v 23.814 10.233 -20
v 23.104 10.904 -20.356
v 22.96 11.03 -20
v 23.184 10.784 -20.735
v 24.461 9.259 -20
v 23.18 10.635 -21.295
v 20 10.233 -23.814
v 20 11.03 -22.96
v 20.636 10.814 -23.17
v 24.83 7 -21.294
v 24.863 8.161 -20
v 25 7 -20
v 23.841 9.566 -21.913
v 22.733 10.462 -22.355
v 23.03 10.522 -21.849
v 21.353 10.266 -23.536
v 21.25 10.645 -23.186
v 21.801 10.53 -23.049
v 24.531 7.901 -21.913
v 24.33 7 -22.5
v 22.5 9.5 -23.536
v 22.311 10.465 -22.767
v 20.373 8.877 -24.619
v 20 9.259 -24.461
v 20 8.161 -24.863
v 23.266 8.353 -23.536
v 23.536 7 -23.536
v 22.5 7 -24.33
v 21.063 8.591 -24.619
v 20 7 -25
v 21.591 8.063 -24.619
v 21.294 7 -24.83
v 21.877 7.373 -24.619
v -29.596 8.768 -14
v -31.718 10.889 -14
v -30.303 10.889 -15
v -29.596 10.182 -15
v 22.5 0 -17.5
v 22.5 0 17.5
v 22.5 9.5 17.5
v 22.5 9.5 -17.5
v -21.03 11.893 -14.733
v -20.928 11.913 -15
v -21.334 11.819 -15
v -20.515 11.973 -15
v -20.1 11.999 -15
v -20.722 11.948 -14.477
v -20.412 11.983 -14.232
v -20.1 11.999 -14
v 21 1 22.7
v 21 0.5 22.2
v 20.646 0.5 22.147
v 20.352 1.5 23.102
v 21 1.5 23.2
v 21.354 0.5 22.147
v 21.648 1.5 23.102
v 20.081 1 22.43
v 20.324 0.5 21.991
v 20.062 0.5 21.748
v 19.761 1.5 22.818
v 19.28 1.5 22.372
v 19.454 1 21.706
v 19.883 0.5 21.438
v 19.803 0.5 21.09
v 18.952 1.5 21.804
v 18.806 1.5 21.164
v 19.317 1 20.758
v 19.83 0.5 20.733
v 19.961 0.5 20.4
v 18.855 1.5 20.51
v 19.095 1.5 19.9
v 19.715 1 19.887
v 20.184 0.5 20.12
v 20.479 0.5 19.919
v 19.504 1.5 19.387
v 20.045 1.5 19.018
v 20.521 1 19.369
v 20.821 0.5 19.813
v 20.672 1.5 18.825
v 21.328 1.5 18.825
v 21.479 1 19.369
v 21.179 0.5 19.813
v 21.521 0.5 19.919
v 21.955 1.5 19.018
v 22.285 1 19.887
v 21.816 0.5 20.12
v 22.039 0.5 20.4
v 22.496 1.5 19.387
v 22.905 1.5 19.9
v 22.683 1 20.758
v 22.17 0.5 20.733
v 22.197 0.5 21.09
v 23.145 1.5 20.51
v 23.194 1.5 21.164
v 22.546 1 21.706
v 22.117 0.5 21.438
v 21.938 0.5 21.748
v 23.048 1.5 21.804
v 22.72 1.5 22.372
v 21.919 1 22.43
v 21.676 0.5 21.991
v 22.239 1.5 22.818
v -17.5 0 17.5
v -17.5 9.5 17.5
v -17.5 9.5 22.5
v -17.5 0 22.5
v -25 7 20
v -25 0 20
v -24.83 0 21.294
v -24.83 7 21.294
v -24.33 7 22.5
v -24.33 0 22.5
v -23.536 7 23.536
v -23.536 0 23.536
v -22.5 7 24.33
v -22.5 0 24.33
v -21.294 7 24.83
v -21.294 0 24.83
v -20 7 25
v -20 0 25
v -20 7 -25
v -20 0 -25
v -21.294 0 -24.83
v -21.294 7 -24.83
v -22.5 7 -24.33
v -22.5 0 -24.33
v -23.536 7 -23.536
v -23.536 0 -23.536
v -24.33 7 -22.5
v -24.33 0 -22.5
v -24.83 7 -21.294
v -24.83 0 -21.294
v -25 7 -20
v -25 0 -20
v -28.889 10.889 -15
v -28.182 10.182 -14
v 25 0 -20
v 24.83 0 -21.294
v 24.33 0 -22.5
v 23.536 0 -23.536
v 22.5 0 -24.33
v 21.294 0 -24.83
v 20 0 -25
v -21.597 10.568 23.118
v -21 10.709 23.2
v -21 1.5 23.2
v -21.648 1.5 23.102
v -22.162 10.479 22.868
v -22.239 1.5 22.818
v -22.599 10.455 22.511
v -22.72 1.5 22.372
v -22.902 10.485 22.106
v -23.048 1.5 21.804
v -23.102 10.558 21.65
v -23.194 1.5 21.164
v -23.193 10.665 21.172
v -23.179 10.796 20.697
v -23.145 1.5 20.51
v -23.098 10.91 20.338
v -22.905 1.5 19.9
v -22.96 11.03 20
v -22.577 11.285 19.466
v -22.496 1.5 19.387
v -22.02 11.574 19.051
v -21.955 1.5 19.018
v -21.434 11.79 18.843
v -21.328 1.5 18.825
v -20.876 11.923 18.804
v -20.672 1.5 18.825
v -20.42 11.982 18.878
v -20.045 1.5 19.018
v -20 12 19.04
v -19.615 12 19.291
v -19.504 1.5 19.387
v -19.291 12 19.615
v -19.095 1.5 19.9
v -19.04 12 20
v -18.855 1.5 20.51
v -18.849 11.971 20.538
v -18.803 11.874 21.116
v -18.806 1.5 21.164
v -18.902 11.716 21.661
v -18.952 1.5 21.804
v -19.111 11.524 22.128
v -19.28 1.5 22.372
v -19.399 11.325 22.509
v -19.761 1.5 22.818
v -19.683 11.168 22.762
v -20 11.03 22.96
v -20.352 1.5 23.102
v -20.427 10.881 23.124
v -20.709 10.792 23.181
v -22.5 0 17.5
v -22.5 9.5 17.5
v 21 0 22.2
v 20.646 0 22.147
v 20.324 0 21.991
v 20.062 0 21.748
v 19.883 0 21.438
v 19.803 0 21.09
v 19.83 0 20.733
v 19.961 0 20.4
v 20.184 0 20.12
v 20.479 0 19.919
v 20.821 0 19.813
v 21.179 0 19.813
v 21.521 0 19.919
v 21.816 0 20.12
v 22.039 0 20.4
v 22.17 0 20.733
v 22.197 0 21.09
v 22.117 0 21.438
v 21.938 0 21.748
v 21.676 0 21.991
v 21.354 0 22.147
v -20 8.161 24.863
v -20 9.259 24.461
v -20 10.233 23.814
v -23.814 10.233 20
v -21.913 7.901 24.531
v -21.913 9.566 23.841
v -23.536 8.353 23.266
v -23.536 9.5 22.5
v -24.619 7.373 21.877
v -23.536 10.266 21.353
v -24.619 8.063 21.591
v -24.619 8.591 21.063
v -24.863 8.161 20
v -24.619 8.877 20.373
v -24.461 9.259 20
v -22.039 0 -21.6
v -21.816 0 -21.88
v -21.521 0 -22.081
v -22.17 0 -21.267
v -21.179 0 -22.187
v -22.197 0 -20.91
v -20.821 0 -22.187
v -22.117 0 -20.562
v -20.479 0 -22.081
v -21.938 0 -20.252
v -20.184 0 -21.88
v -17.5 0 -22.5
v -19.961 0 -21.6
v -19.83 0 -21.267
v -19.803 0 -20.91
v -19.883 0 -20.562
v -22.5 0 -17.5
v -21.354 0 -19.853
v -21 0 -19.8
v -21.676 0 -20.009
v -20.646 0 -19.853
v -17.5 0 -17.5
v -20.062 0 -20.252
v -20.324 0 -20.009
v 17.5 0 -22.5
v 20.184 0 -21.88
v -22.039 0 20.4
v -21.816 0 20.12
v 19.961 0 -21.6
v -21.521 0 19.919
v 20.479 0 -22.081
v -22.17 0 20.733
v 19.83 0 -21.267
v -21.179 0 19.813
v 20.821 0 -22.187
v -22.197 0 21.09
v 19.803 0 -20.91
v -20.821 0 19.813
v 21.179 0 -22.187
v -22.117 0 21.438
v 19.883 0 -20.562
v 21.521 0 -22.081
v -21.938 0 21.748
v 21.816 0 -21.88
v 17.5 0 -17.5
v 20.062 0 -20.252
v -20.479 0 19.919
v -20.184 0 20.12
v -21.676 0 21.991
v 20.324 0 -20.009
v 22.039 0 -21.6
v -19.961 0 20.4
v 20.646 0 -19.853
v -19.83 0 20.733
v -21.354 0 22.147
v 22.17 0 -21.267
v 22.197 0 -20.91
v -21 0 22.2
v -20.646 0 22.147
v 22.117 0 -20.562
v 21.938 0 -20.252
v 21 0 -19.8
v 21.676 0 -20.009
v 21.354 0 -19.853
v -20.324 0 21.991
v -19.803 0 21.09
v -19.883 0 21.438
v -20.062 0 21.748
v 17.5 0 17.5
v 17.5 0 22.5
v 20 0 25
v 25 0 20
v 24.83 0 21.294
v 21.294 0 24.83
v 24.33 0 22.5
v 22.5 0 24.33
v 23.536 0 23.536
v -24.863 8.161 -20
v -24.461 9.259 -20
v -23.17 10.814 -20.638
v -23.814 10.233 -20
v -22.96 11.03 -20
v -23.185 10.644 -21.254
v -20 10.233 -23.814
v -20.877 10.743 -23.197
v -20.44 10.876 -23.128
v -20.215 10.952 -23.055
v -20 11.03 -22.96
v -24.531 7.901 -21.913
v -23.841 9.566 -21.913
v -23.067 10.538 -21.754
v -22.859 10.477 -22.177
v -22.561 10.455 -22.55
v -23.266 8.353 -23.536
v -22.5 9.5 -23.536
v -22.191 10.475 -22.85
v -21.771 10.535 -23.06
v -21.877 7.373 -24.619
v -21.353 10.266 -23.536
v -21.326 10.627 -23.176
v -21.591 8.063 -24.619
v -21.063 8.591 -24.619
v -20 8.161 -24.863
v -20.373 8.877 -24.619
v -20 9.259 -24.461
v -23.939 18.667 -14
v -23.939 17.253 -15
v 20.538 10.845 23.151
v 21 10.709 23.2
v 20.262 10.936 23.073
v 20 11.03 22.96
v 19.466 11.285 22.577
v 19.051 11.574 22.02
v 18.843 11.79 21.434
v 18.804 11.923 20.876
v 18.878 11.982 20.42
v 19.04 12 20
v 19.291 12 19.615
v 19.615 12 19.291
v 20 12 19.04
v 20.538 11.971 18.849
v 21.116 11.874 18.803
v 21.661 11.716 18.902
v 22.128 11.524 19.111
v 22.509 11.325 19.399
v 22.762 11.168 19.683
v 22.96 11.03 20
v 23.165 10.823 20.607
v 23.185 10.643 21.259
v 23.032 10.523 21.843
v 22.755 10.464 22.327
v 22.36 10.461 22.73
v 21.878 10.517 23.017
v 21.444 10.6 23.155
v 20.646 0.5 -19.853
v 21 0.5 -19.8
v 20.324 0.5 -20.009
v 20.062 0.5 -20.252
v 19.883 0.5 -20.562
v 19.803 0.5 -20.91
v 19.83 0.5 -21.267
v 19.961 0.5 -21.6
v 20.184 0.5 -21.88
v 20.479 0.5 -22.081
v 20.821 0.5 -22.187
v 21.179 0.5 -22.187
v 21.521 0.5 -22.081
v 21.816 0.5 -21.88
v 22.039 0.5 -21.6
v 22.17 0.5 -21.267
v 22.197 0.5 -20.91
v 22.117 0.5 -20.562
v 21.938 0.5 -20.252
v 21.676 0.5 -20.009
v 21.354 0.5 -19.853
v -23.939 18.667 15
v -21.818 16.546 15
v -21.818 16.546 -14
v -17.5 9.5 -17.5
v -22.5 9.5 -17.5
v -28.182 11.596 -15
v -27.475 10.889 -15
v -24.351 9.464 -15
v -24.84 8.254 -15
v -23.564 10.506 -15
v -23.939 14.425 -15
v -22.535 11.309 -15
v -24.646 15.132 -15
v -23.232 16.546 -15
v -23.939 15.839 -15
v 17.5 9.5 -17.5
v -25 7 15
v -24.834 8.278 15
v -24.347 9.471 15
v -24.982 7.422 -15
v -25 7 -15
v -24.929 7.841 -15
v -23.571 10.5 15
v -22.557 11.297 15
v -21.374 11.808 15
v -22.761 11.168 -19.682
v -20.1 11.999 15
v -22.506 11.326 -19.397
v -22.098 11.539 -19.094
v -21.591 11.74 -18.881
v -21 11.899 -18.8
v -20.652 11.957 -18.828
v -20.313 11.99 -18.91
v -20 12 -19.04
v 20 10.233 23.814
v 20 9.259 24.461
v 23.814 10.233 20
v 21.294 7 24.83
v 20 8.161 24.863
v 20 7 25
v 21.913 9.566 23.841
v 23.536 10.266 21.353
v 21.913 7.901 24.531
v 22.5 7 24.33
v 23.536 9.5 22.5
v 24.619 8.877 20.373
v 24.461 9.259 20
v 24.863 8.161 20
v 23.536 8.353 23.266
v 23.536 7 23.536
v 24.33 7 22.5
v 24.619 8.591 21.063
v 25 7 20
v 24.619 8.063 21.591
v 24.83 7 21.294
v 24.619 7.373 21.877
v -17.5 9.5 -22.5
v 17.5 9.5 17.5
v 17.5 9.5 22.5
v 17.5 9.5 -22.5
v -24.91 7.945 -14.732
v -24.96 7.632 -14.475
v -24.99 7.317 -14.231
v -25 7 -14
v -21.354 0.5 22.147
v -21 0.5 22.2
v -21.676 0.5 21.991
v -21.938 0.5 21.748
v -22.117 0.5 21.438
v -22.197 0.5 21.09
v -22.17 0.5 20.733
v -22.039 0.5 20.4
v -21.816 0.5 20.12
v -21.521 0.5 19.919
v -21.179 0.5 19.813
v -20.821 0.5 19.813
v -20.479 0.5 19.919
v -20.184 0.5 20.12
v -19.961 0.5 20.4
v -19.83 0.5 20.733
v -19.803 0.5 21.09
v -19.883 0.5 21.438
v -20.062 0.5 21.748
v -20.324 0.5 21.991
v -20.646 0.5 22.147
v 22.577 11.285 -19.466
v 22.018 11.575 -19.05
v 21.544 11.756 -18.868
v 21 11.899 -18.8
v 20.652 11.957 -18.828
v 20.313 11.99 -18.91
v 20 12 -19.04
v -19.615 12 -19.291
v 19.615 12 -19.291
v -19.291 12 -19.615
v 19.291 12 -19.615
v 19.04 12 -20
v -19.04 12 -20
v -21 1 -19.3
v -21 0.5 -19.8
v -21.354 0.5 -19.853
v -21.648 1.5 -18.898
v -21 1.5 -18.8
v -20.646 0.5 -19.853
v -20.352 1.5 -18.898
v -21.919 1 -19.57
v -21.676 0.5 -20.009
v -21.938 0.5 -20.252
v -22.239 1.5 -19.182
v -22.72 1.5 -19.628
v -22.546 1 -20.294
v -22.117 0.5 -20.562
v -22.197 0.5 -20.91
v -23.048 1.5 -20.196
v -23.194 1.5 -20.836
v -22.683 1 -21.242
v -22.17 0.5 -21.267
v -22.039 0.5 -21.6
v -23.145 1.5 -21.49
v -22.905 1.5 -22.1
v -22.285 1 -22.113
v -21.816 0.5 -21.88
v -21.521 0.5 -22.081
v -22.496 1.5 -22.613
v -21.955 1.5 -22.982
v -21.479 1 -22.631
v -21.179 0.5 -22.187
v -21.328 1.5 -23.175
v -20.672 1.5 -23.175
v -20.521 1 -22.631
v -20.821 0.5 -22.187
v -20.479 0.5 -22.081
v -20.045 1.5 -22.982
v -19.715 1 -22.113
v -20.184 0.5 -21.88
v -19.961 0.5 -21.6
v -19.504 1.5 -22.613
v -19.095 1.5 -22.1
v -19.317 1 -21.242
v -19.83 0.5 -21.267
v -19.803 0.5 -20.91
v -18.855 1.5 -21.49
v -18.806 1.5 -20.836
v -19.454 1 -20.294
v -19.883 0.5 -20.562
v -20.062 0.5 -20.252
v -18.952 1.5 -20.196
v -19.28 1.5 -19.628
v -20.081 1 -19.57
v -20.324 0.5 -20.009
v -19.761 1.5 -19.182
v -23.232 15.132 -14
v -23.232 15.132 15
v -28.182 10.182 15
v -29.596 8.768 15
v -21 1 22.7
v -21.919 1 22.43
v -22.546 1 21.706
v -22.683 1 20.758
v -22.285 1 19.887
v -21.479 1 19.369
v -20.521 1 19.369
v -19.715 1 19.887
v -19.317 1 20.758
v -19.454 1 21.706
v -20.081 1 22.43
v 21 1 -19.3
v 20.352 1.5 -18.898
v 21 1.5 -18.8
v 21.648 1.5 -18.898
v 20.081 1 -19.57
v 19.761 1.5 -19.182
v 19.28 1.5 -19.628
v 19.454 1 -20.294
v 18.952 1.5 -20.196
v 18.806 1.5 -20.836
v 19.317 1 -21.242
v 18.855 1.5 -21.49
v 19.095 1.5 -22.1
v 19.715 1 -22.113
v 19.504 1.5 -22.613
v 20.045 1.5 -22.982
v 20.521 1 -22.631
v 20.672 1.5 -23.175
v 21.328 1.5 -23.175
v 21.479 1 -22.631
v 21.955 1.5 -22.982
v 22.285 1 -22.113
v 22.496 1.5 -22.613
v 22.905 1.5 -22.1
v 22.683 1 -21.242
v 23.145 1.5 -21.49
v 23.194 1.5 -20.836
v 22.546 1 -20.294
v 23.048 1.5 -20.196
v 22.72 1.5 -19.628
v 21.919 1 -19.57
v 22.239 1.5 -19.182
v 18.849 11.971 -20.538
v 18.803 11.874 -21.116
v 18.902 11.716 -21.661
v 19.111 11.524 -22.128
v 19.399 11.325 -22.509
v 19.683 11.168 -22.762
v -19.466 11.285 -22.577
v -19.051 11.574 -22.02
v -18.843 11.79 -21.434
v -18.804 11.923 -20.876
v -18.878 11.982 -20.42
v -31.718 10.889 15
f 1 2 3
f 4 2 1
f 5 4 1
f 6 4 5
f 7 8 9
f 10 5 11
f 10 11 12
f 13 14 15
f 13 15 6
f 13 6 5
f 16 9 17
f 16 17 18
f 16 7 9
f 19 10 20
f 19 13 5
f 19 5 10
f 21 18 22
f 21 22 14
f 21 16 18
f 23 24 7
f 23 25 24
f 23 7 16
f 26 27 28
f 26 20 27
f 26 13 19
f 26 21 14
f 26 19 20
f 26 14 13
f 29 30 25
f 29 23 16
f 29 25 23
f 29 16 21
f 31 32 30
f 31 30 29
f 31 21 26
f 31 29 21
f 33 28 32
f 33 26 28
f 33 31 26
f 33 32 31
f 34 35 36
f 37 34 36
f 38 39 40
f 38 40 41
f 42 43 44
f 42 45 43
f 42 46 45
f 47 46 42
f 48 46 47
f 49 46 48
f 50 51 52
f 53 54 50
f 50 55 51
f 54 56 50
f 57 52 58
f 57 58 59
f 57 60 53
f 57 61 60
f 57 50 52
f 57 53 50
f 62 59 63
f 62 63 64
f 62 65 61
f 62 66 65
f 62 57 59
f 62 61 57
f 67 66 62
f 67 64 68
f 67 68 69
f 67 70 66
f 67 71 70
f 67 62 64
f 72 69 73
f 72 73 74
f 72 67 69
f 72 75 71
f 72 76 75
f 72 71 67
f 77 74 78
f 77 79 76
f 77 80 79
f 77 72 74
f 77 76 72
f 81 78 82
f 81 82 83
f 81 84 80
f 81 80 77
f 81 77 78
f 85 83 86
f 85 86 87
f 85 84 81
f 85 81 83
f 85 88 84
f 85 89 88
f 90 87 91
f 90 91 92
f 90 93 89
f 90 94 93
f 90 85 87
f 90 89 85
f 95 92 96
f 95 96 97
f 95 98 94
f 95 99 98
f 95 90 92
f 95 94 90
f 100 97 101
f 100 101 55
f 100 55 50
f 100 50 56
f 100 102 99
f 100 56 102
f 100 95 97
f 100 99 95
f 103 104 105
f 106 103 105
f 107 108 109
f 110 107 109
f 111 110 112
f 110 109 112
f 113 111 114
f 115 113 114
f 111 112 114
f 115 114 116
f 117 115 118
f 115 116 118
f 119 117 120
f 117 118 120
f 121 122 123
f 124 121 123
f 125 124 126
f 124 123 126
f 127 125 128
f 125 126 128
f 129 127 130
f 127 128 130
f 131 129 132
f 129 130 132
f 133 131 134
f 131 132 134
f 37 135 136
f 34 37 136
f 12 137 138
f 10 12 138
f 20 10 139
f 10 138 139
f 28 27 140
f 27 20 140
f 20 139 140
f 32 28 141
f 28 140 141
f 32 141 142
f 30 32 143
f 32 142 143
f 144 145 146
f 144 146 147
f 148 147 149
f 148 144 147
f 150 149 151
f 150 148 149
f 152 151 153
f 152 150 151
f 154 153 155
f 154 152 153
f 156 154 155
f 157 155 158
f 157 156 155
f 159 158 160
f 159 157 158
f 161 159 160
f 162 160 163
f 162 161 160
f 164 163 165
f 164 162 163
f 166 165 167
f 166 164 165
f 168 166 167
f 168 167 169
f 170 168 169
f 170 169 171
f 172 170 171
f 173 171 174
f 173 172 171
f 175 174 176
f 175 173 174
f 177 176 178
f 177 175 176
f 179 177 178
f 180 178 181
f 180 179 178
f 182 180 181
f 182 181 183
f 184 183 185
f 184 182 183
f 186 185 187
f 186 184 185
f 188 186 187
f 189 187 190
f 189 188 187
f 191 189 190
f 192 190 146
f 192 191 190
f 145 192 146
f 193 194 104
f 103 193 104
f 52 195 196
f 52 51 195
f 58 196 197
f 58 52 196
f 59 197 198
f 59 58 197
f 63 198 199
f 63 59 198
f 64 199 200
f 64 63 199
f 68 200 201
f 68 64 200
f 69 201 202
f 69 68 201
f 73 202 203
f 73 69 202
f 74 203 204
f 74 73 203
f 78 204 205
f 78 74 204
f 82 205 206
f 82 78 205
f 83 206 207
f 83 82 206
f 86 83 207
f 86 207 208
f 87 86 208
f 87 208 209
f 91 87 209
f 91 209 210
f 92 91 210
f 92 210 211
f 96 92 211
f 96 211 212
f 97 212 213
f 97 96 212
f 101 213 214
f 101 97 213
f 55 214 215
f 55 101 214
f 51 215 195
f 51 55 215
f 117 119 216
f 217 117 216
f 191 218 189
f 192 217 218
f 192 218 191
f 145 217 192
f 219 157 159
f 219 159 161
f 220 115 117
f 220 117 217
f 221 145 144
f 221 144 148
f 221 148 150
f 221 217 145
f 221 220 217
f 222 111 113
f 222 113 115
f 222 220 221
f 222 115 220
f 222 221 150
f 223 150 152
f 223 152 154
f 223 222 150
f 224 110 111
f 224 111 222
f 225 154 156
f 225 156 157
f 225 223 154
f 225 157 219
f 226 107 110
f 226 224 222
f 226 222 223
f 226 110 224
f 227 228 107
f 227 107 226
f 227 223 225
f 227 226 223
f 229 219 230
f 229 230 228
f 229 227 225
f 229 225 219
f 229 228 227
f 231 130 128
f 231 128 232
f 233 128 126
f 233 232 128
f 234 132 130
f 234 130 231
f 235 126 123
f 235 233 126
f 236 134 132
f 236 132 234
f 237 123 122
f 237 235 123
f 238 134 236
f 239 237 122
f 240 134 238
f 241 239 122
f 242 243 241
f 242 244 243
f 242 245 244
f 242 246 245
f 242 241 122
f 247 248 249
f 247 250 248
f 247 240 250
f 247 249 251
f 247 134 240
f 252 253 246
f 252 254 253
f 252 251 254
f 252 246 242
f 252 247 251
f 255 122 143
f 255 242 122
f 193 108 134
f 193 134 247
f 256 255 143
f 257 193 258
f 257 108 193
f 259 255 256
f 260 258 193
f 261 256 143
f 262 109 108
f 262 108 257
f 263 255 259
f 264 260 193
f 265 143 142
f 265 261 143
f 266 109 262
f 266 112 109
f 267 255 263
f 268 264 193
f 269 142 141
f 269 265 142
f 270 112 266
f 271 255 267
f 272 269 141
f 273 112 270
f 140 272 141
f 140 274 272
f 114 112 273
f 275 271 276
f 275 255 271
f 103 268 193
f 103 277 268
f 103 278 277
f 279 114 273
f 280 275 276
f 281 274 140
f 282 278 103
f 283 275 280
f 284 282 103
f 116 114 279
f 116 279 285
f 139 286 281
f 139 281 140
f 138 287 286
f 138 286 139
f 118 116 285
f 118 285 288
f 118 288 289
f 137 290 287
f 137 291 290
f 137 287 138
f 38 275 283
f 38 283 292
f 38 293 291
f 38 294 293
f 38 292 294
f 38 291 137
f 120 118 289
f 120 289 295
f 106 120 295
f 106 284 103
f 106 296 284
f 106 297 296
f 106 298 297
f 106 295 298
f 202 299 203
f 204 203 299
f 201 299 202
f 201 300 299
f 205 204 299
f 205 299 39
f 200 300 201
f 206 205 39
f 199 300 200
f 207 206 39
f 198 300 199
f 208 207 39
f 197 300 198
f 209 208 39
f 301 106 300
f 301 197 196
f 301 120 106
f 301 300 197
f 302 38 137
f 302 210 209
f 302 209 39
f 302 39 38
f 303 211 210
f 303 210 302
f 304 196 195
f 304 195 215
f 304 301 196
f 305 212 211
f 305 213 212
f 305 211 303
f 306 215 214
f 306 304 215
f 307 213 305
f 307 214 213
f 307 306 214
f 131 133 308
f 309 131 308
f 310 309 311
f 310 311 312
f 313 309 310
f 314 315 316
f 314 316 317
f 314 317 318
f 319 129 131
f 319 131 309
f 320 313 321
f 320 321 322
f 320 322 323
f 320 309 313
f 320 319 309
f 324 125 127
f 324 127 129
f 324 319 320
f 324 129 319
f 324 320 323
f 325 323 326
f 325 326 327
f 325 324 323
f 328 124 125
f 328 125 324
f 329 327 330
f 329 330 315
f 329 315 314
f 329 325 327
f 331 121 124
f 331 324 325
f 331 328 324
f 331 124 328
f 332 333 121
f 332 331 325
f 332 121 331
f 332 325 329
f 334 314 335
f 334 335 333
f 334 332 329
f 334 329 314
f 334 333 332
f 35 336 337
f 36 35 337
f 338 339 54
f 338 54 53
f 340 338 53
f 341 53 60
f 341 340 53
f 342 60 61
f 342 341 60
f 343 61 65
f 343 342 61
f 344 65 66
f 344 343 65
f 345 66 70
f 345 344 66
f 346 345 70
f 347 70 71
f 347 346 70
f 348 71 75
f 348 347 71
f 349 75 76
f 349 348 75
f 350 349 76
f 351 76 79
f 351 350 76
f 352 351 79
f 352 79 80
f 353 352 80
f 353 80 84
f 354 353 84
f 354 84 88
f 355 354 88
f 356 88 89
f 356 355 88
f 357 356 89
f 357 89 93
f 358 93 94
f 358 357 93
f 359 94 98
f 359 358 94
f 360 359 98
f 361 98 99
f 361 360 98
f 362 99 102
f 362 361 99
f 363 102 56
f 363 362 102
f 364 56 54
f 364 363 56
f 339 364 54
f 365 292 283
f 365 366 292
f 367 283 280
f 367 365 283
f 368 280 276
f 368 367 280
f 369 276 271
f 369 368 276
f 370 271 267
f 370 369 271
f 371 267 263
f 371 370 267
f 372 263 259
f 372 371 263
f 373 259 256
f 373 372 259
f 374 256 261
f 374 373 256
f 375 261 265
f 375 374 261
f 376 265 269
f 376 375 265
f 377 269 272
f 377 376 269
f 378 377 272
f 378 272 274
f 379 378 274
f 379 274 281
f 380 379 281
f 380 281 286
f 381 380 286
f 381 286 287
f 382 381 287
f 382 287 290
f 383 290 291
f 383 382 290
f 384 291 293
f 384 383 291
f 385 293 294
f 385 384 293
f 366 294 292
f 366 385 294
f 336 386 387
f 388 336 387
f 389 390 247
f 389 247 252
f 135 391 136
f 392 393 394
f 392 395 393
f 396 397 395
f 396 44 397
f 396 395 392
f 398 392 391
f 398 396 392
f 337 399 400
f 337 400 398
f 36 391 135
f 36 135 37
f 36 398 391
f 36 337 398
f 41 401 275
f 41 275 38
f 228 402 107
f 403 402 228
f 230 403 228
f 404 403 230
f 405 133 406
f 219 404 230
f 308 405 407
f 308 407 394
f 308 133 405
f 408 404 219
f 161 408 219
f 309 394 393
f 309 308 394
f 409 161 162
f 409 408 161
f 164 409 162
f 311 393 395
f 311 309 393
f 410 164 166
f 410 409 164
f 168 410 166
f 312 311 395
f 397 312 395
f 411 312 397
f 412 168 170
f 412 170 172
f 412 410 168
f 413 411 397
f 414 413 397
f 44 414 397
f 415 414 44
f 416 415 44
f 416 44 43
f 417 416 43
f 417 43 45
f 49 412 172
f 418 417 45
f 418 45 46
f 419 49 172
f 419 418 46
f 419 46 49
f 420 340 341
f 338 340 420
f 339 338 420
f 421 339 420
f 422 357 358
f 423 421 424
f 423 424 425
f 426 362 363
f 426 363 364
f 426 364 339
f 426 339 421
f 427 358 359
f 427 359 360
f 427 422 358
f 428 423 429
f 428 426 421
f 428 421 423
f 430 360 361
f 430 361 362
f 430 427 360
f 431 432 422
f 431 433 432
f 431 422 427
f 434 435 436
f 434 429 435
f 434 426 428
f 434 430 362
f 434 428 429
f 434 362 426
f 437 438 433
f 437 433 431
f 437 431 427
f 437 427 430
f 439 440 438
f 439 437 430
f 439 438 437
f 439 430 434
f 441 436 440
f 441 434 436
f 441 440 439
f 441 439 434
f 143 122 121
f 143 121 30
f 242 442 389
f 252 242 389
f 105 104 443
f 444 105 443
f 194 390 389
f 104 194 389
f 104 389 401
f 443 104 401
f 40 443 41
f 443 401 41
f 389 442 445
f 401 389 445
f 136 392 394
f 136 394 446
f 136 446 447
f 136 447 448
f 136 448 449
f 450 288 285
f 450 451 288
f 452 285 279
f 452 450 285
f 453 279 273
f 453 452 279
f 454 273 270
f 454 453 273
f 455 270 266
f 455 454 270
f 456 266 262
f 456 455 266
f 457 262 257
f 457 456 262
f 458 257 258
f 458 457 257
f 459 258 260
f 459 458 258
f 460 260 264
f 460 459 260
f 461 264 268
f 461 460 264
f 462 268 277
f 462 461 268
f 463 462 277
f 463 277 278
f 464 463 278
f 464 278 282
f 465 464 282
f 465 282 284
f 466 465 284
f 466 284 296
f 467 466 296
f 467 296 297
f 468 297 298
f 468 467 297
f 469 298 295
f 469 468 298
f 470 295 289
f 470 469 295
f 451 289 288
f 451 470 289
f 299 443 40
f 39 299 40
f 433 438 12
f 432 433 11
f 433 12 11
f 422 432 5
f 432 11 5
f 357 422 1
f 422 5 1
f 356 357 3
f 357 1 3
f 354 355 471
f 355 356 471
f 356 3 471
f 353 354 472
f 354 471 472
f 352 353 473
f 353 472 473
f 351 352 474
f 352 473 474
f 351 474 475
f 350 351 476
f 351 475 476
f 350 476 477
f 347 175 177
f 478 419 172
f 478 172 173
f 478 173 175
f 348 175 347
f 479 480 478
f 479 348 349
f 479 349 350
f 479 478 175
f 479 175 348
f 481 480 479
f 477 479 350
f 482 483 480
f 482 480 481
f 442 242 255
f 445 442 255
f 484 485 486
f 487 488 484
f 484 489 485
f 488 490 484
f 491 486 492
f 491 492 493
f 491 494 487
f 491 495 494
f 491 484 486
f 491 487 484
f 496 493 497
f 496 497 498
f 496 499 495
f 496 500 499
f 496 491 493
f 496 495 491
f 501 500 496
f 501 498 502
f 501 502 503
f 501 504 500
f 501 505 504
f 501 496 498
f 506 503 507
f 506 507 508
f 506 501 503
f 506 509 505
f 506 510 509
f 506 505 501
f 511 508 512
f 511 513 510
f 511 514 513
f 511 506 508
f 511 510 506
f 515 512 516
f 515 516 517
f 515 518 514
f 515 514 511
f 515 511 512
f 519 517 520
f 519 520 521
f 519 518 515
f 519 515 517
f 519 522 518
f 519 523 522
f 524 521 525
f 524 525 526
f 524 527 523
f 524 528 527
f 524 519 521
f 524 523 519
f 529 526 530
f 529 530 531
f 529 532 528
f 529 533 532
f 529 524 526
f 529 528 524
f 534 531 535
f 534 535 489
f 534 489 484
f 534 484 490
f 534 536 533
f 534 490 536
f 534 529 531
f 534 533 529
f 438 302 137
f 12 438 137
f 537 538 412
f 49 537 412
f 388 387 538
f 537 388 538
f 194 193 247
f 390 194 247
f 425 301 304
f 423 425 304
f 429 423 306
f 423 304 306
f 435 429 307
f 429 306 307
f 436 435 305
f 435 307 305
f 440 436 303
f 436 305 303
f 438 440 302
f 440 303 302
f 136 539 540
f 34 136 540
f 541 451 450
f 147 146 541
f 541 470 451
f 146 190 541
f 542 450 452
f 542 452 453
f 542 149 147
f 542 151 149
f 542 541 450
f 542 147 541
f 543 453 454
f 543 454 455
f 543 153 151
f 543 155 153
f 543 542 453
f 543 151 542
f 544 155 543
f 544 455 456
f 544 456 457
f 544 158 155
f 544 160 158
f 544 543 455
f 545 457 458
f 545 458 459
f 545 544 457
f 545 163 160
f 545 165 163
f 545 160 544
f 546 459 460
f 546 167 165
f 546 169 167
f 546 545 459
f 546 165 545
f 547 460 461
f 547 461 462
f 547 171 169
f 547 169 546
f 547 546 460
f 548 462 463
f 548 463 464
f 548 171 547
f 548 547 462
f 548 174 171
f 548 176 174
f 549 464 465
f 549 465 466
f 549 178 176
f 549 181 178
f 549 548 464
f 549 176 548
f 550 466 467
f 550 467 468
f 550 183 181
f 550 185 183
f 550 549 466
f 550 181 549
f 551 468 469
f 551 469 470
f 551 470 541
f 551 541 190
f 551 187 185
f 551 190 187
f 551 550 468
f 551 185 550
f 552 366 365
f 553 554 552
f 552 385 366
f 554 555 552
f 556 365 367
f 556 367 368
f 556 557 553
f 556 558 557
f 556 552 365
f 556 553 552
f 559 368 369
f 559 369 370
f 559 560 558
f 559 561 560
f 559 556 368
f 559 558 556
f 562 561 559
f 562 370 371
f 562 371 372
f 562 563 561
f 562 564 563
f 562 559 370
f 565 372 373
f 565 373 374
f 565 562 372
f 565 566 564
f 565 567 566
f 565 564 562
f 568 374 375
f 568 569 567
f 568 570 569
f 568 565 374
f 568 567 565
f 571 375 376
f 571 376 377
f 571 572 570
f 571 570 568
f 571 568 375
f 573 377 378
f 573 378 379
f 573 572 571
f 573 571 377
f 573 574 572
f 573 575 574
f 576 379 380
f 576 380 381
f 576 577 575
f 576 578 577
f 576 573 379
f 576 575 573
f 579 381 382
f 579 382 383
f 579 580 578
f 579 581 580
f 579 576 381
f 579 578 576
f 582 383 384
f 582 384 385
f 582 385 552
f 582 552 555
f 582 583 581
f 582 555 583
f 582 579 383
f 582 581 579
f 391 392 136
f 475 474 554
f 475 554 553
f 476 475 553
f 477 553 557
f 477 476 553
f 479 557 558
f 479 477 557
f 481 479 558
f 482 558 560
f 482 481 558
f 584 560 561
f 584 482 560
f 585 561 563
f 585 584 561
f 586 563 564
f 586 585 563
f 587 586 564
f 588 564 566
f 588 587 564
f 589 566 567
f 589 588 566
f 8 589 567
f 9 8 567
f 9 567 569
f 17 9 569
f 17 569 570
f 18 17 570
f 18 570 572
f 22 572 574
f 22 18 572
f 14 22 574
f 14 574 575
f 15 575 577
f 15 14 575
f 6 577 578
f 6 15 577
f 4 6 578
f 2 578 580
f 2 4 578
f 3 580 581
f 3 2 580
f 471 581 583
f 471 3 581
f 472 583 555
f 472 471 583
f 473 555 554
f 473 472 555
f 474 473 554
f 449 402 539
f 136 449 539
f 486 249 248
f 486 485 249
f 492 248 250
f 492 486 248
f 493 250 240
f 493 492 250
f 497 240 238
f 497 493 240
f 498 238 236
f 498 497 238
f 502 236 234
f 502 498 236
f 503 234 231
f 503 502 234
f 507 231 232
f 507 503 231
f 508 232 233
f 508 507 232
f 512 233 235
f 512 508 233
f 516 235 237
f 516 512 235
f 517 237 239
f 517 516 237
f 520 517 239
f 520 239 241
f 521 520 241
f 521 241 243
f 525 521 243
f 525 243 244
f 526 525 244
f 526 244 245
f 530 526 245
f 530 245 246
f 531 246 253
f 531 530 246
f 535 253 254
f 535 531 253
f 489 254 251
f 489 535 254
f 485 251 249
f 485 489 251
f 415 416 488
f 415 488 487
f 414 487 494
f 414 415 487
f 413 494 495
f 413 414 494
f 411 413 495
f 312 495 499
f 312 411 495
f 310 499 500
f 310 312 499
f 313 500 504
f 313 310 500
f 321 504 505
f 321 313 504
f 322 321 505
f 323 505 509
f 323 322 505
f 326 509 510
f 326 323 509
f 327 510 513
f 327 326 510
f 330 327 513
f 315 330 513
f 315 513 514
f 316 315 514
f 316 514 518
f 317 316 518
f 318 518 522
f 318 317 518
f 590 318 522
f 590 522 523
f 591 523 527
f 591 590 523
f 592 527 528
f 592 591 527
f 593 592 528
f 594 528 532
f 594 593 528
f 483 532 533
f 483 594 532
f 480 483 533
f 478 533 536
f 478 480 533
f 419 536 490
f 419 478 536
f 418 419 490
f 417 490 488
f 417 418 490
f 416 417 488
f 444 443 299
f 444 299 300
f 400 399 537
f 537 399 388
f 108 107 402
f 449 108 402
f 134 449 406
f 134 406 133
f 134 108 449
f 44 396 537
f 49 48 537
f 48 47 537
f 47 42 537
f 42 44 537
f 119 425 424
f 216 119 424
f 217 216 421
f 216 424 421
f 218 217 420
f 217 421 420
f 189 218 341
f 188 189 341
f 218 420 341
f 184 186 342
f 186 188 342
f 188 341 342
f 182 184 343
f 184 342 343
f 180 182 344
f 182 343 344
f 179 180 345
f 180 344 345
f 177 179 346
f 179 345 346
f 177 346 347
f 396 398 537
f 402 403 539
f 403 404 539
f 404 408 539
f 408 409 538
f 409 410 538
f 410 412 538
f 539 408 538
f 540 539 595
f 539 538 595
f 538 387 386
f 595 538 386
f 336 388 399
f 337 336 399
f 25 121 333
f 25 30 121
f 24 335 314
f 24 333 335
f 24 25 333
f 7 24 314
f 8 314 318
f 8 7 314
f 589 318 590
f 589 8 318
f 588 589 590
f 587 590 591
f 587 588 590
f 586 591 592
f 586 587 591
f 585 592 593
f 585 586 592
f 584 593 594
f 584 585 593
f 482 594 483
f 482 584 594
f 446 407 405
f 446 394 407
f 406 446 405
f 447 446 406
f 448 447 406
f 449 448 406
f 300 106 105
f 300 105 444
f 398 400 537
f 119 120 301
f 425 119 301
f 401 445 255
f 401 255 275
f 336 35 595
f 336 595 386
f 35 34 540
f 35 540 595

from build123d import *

# Parameters (mm, degrees)
SKETCH1_W                                    = 50
SKETCH1_H                                    = 50
MAIN_BODY_DEPTH                              = 12
SHELL1_T                                     = -2.5
FILLET1_R                                    = 5
SKETCH6_W                                    = 5
SKETCH6_H                                    = 5
SCREW_SUPPORTS_DEPTH                         = 9.5
FILLET2_R                                    = 5
CSK_SLOT_FOR_M2_COUNTERSUNK_FLAT_HEA_2_COUNT = 2
CSK_SLOT_FOR_M2_COUNTERSUNK_FLAT_HEA_2_PITCH = 42
CSK_SLOT_FOR_M2_COUNTERSUNK_FLAT_HEA_3_COUNT = 2
CSK_SLOT_FOR_M2_COUNTERSUNK_FLAT_HEA_3_PITCH = 42
CSK_SLOT_FOR_M2_COUNTERSUNK_FLAT_HEA_4_COUNT = 2
CSK_SLOT_FOR_M2_COUNTERSUNK_FLAT_HEA_4_PITCH = 59.39696962
SKETCH13_W                                   = 13
SKETCH13_H                                   = 26
TOP_CONNECTOR_EXTRUDE_DEPTH                  = 6
SKETCH14_W                                   = 2
SKETCH14_H                                   = 3
DOVETAIL_CUT_DEPTH                           = 51.884673656
FILLET3_R                                    = 2
SKETCH16_W                                   = 8
SKETCH16_H                                   = 3.3
POGO_BODY_CUT_DEPTH                          = 8
SKETCH19_W                                   = 8
SKETCH19_H                                   = 0.6
POGO_BACK_SUPPORT_DEPTH                      = 3.2
SKETCH20_W                                   = 8
SKETCH20_H                                   = 2
POGO_STOPPER_DEPTH                           = 0.6
SKETCH23_W                                   = 15
SKETCH23_H                                   = 40
CUT_EXTRUDE1_DEPTH                           = 38.336309539
BOSS_EXTRUDE1_START                          = -10
BOSS_EXTRUDE1_DEPTH                          = 30
BOSS_EXTRUDE2_DEPTH                          = 30
CHAMFER2_SIZE                                = 1


with BuildPart() as part:
    # Sketch1 → main body (new body)
    with BuildSketch(Plane(origin=(0, 0, 0), x_dir=(1, 0, 0), z_dir=(0, 1, 0))):
        Rectangle(SKETCH1_W, SKETCH1_H)
    extrude(amount=MAIN_BODY_DEPTH)

    # Shell1
    shell1_openings = [part.faces().sort_by_distance(p)[0] for p in [
        (0, 0, 0),
    ]]
    offset(amount=SHELL1_T, openings=shell1_openings, kind=Kind.INTERSECTION)

    # Fillet1
    fillet1_edges = [part.edges().sort_by_distance(p)[0] for p in [
        (25, 12, 0),
        (0, 12, -25),
        (-25, 12, 0),
        (0, 12, 25),
    ]]
    fillet(fillet1_edges, radius=FILLET1_R)

    # Sketch6 → screw supports (add)
    with BuildSketch(Plane.XZ.offset(-9.5)):
        with Locations((20, 20)):
            Rectangle(SKETCH6_W, SKETCH6_H)
        with Locations((-20, 20)):
            Rectangle(SKETCH6_W, SKETCH6_H)
        with Locations((20, -20)):
            Rectangle(SKETCH6_W, SKETCH6_H)
        with Locations((-20, -20)):
            Rectangle(SKETCH6_W, SKETCH6_H)
    extrude(amount=SCREW_SUPPORTS_DEPTH)

    # Fillet2
    # the kernel refuses this fillet: 5 mm, written as the material it takes off along each edge
    with BuildSketch(Plane(origin=(-20, 7, 20), x_dir=(0, 0, 1), z_dir=(-1, 0, 0))) as fillet2_piece_1_section:
        Polygon((0, 0), (FILLET2_R, 0), (FILLET2_R, FILLET2_R), (0, FILLET2_R), align=None)
    fillet2_piece_1 = extrude(amount=FILLET2_R, mode=Mode.PRIVATE)
    fillet2_piece_1 = fillet2_piece_1 - Plane(origin=(-20, 7, 20), x_dir=(0, -0.7071067811865475, -0.7071067811865475), z_dir=(-1, 0, 0)) * Sphere(FILLET2_R, mode=Mode.PRIVATE)
    add(fillet2_piece_1, mode=Mode.SUBTRACT)
    with BuildSketch(Plane(origin=(-20, 7, -20), x_dir=(-1, 0, 0), z_dir=(0, 0, -1))) as fillet2_piece_2_section:
        Polygon((0, 0), (FILLET2_R, 0), (FILLET2_R, FILLET2_R), (0, FILLET2_R), align=None)
    fillet2_piece_2 = extrude(amount=FILLET2_R, mode=Mode.PRIVATE)
    fillet2_piece_2 = fillet2_piece_2 - Plane(origin=(-20, 7, -20), x_dir=(0.7071067811865475, -0.7071067811865475, 0), z_dir=(0, 0, -1)) * Sphere(FILLET2_R, mode=Mode.PRIVATE)
    add(fillet2_piece_2, mode=Mode.SUBTRACT)
    with BuildSketch(Plane(origin=(20, 7, 20), x_dir=(0, 0, 1), z_dir=(1, 0, 0))) as fillet2_piece_3_section:
        Polygon((0, 0), (FILLET2_R, 0), (FILLET2_R, -FILLET2_R), (0, -FILLET2_R), align=None)
    fillet2_piece_3 = extrude(amount=FILLET2_R, mode=Mode.PRIVATE)
    fillet2_piece_3 = fillet2_piece_3 - Plane(origin=(20, 7, 20), x_dir=(0, -0.7071067811865475, -0.7071067811865475), z_dir=(1, 0, 0)) * Sphere(FILLET2_R, mode=Mode.PRIVATE)
    add(fillet2_piece_3, mode=Mode.SUBTRACT)
    with BuildSketch(Plane(origin=(20, 7, -20), x_dir=(1, 0, 0), z_dir=(0, 0, -1))) as fillet2_piece_4_section:
        Polygon((0, 0), (FILLET2_R, 0), (FILLET2_R, -FILLET2_R), (0, -FILLET2_R), align=None)
    fillet2_piece_4 = extrude(amount=FILLET2_R, mode=Mode.PRIVATE)
    fillet2_piece_4 = fillet2_piece_4 - Plane(origin=(20, 7, -20), x_dir=(-0.7071067811865475, -0.7071067811865475, 0), z_dir=(0, 0, -1)) * Sphere(FILLET2_R, mode=Mode.PRIVATE)
    add(fillet2_piece_4, mode=Mode.SUBTRACT)
    with BuildSketch(Plane(origin=(25, -12.5, -25), x_dir=(-1, 0, 0), z_dir=(0, 1, 0)), Plane(origin=(25, -12.5, 25), x_dir=(0, 0, -1), z_dir=(0, 1, 0))) as fillet2_piece_5:
        with BuildLine():
            CenterArc((FILLET2_R, FILLET2_R), FILLET2_R, 180, 90)
            Line((0, FILLET2_R), (0, 0))
            Line((0, 0), (FILLET2_R, 0))
        make_face()
    extrude(amount=19.5, mode=Mode.SUBTRACT)
    with BuildSketch(Plane(origin=(-25, -12.5, -25), x_dir=(1, 0, 0), z_dir=(0, 1, 0)), Plane(origin=(-25, -12.5, 25), x_dir=(0, 0, -1), z_dir=(0, 1, 0))) as fillet2_piece_6:
        with BuildLine():
            CenterArc((FILLET2_R, -FILLET2_R), FILLET2_R, 90, 90)
            Line((0, -FILLET2_R), (0, 0))
            Line((0, 0), (FILLET2_R, 0))
        make_face()
    extrude(amount=19.5, mode=Mode.SUBTRACT)

    # Sketch12 → CSK SLOT for M2 Countersunk Flat Head Screw1 (revolve, cut)
    with BuildSketch(Plane(origin=(-21, 12, -21), x_dir=(0, 0, 1), z_dir=(1, 0, 0))):
        Polygon((0, 0), (0, 12), (1.2, 12), (1.2, 11.5), (2.2, 10.5), (2.2, 0), align=None)
    csk_slot_for_m2_countersunk_flat_head_sc = revolve(axis=Axis((-21, 18.35, -21), (0, -1, 0)), mode=Mode.SUBTRACT)

    # CSK SLOT for M2 Countersunk Flat Hea 2: CSK SLOT for M2 Countersunk Flat Head Screw1 ×2
    with Locations(*[(i * CSK_SLOT_FOR_M2_COUNTERSUNK_FLAT_HEA_2_PITCH, 0, 0) for i in range(1, CSK_SLOT_FOR_M2_COUNTERSUNK_FLAT_HEA_2_COUNT)]):
        add(csk_slot_for_m2_countersunk_flat_head_sc, mode=Mode.SUBTRACT)

    # CSK SLOT for M2 Countersunk Flat Hea 3: CSK SLOT for M2 Countersunk Flat Head Screw1 ×2
    with Locations(*[(0, 0, i * CSK_SLOT_FOR_M2_COUNTERSUNK_FLAT_HEA_3_PITCH) for i in range(1, CSK_SLOT_FOR_M2_COUNTERSUNK_FLAT_HEA_3_COUNT)]):
        add(csk_slot_for_m2_countersunk_flat_head_sc, mode=Mode.SUBTRACT)

    # CSK SLOT for M2 Countersunk Flat Hea 4: CSK SLOT for M2 Countersunk Flat Head Screw1 ×2
    with Locations(*[Vector(0.7071067811865475, 0, 0.7071067811865477) * (i * CSK_SLOT_FOR_M2_COUNTERSUNK_FLAT_HEA_4_PITCH) for i in range(1, CSK_SLOT_FOR_M2_COUNTERSUNK_FLAT_HEA_4_COUNT)]):
        add(csk_slot_for_m2_countersunk_flat_head_sc, mode=Mode.SUBTRACT)

    # Sketch13 → top connector extrude (add)
    with BuildSketch(Plane(origin=(0, 12, 0), x_dir=(1, 0, 0), z_dir=(0, 1, 0))):
        with Locations((0, -2.5)):
            Rectangle(SKETCH13_W, SKETCH13_H)
    extrude(amount=TOP_CONNECTOR_EXTRUDE_DEPTH)

    # Sketch14 → dovetail cut (cut, through all)
    with BuildSketch(Plane.XY.offset(15.5)):
        with Locations((-5.5, 13.5)):
            Rectangle(SKETCH14_W, SKETCH14_H)
        with Locations((5.5, 13.5)):
            Rectangle(SKETCH14_W, SKETCH14_H)
    extrude(amount=-DOVETAIL_CUT_DEPTH, mode=Mode.SUBTRACT)

    # Fillet3
    fillet3_edges = [part.edges().sort_by_distance(p)[0] for p in [
        (0, 18, -10.5),
        (-6.5, 16.5, -10.5),
        (6.5, 16.5, -10.5),
    ]]
    fillet(fillet3_edges, radius=FILLET3_R)

    # Sketch16 → pogo body cut (cut)
    with BuildSketch(Plane(origin=(0, 0, -10.5), x_dir=(-1, 0, 0), z_dir=(0, 0, -1))):
        with Locations((0, 16.35)):
            Rectangle(SKETCH16_W, SKETCH16_H)
    extrude(amount=-POGO_BODY_CUT_DEPTH, mode=Mode.SUBTRACT)

    # Sketch19 → pogo back support (add)
    with BuildSketch(Plane(origin=(0, 0, -2.5), x_dir=(-1, 0, 0), z_dir=(0, 0, -1))):
        with Locations((0, 17.7)):
            Rectangle(SKETCH19_W, SKETCH19_H)
    extrude(amount=POGO_BACK_SUPPORT_DEPTH)

    # Sketch20 → pogo stopper (add)
    with BuildSketch(Plane.XZ.offset(-17.4)):
        with Locations((0, -3.5)):
            Rectangle(SKETCH20_W, SKETCH20_H)
    extrude(amount=POGO_STOPPER_DEPTH)

    # Sketch23 → Cut-Extrude1 (cut, through all)
    with BuildSketch(Plane(origin=(0, 12, 0), x_dir=(1, 0, 0), z_dir=(0, 1, 0))):
        Rectangle(SKETCH23_W, SKETCH23_H)
    extrude(amount=CUT_EXTRUDE1_DEPTH, mode=Mode.SUBTRACT)

    # Sketch27 → Boss-Extrude1 (add)
    with BuildSketch(Plane.XY.offset(25).offset(BOSS_EXTRUDE1_START)):
        Polygon((-28.181980515, 10.181980515), (-23.232233047, 15.131727984), (-20.050252532, 11.949747468), (-25, 7), align=None)
    extrude(amount=-BOSS_EXTRUDE1_DEPTH)

    # Sketch29 → Boss-Extrude2 (add)
    with BuildSketch(Plane.XY.offset(15)):
        Polygon((-31.717514421, 10.889087297), (-23.939339828, 18.66726189), (-21.818019485, 16.545941546), (-29.596194078, 8.767766953), align=None)
    extrude(amount=-BOSS_EXTRUDE2_DEPTH)

    # Chamfer2
    # the kernel refuses this chamfer: 1 mm, written as the material it takes off along each edge
    with BuildSketch(Plane(origin=(-23.18154552, 5.18154552, -15), x_dir=(0.7068394360706733, 0.7068394360706738, -0.027495876610585664), z_dir=(-0.7071067811865477, 0.7071067811865474, 0))) as chamfer2_piece_1_section:
        Polygon((CHAMFER2_SIZE * 0.999621916911, -CHAMFER2_SIZE * 0.0274958766106), (-CHAMFER2_SIZE * 0.0274958766106, -CHAMFER2_SIZE * 0.999621916911), (0, 0), align=None)
    chamfer2_piece_1 = extrude(amount=7.071682988, mode=Mode.PRIVATE)
    chamfer2_piece_1 = chamfer2_piece_1 - Plane(origin=(-20, 7, -14.821451395), x_dir=(-1, 0, 0), z_dir=(0, 0, 1)) * Cylinder(5, 19, mode=Mode.PRIVATE)
    add(chamfer2_piece_1, mode=Mode.SUBTRACT)
    with BuildSketch(Plane(origin=(-23.232233047, 15.131727984, -15), x_dir=(-0.7068394360706741, -0.7068394360706729, -0.027495876610583902), z_dir=(0.7071067811865469, -0.7071067811865481, 0))) as chamfer2_piece_2_section:
        Polygon((CHAMFER2_SIZE * 0.999621916911, -CHAMFER2_SIZE * 0.0274958766106), (-CHAMFER2_SIZE * 0.0274958766106, -CHAMFER2_SIZE * 0.999621916911), (0, 0), align=None)
    chamfer2_piece_2 = extrude(amount=7.002015834, mode=Mode.PRIVATE)
    chamfer2_piece_2 = chamfer2_piece_2 - Plane(origin=(-20, 7, -14.663806986), x_dir=(-1, 0, 0), z_dir=(0, 0, 1)) * Cylinder(5, 19, mode=Mode.PRIVATE)
    add(chamfer2_piece_2, mode=Mode.SUBTRACT)
    with BuildSketch(Plane(origin=(-27.777739598, 6.949312473, -15), x_dir=(-0.01944252080601335, -0.0194425208060134, 0.9996219169112968), z_dir=(-0.7071067811865485, 0.7071067811865467, 0)), Plane(origin=(-25.757794308, 20.485716369, -15), x_dir=(0.019442520806015502, 0.019442520806015565, 0.9996219169112968), z_dir=(0.7071067811865487, -0.7071067811865464, 0))) as chamfer2_piece_3:
        Polygon((CHAMFER2_SIZE * 0.999621916911, CHAMFER2_SIZE * 0.0274958766106), (-CHAMFER2_SIZE * 0.0274958766106, CHAMFER2_SIZE * 0.999621916911), (0, 0), align=None)
    extrude(amount=8.143365976, mode=Mode.SUBTRACT)
    with BuildSketch(Plane(origin=(-33.535968901, 9.070632817, -15), x_dir=(-0.01944252080601553, 0.019442520806015537, 0.9996219169112968), z_dir=(0.7071067811865477, 0.7071067811865474, 0))) as chamfer2_piece_4:
        Polygon((CHAMFER2_SIZE * 0.999621916911, CHAMFER2_SIZE * 0.0274958766106), (-CHAMFER2_SIZE * 0.0274958766106, CHAMFER2_SIZE * 0.999621916911), (0, 0), align=None)
    extrude(amount=16.143365976, mode=Mode.SUBTRACT)
    with BuildSketch(Plane(origin=(-19.999565005, 18.364396026, -15), x_dir=(-0.7068394360706738, 0.7068394360706733, -0.0274958766105857), z_dir=(-0.7071067811865474, -0.7071067811865478, 0)), Plane(origin=(-28.181980515, 10.181980515, -15), x_dir=(-0.7068394360706738, 0.7068394360706733, -0.027495876610585664), z_dir=(-0.7071067811865474, -0.7071067811865478, 0))) as chamfer2_piece_5:
        Polygon((CHAMFER2_SIZE * 0.999621916911, -CHAMFER2_SIZE * 0.0274958766106), (-CHAMFER2_SIZE * 0.0274958766106, -CHAMFER2_SIZE * 0.999621916911), (0, 0), align=None)
    extrude(amount=4.571682988, mode=Mode.SUBTRACT)
    with BuildSketch(Plane(origin=(-23.18154552, 5.18154552, -15), x_dir=(0.7068394360706733, 0.7068394360706738, -0.027495876610585664), z_dir=(-0.7071067811865477, 0.7071067811865474, 0))) as chamfer2_piece_6a_section:
        Polygon((CHAMFER2_SIZE * 0.999621916911, -CHAMFER2_SIZE * 0.0274958766106), (-CHAMFER2_SIZE * 0.0274958766106, -CHAMFER2_SIZE * 0.999621916911), (0, 0), align=None)
    chamfer2_piece_6a = extrude(amount=9.643365976, mode=Mode.PRIVATE)
    chamfer2_piece_6a = split(chamfer2_piece_6a, bisect_by=Plane(origin=(-27.948781205, 10.415179825, -14.670206373), z_dir=(-0.7071067811865478, 0.7071067811865474, 0)), keep=Keep.TOP, mode=Mode.PRIVATE)
    with BuildSketch(Plane(origin=(-26.363526035, 12.000434995, -15), x_dir=(-0.7068394360706738, 0.7068394360706733, -0.027495876610585664), z_dir=(-0.7071067811865474, -0.7071067811865478, 0))) as chamfer2_piece_6b_section:
        Polygon((CHAMFER2_SIZE * 0.999621916911, -CHAMFER2_SIZE * 0.0274958766106), (-CHAMFER2_SIZE * 0.0274958766106, -CHAMFER2_SIZE * 0.999621916911), (0, 0), align=None)
    chamfer2_piece_6b = extrude(amount=7.143365976, mode=Mode.PRIVATE)
    chamfer2_piece_6b = split(chamfer2_piece_6b, bisect_by=Plane(origin=(-28.415179825, 10.415179825, -14.670206373), z_dir=(0.7071067811865474, 0.7071067811865477, 0)), keep=Keep.TOP, mode=Mode.PRIVATE)
    chamfer2_piece_6 = chamfer2_piece_6a & chamfer2_piece_6b
    add(chamfer2_piece_6, mode=Mode.SUBTRACT)
    with BuildSketch(Plane(origin=(-19.999565005, 18.364396026, -15), x_dir=(-0.7068394360706738, 0.7068394360706733, -0.0274958766105857), z_dir=(-0.7071067811865474, -0.7071067811865478, 0))) as chamfer2_piece_7a_section:
        Polygon((CHAMFER2_SIZE * 0.999621916911, -CHAMFER2_SIZE * 0.0274958766106), (-CHAMFER2_SIZE * 0.0274958766106, -CHAMFER2_SIZE * 0.999621916911), (0, 0), align=None)
    chamfer2_piece_7a = extrude(amount=7.143365976, mode=Mode.PRIVATE)
    chamfer2_piece_7a = split(chamfer2_piece_7a, bisect_by=Plane(origin=(-23.465432357, 15.364927294, -14.670206373), z_dir=(-0.7071067811865481, -0.7071067811865469, 0)), keep=Keep.TOP, mode=Mode.PRIVATE)
    with BuildSketch(Plane(origin=(-25.050687527, 16.950182463, -15), x_dir=(-0.7068394360706741, -0.7068394360706729, -0.02749587661058563), z_dir=(0.7071067811865469, -0.7071067811865481, 0))) as chamfer2_piece_7b_section:
        Polygon((CHAMFER2_SIZE * 0.999621916911, -CHAMFER2_SIZE * 0.0274958766106), (-CHAMFER2_SIZE * 0.0274958766106, -CHAMFER2_SIZE * 0.999621916911), (0, 0), align=None)
    chamfer2_piece_7b = extrude(amount=9.573698822, mode=Mode.PRIVATE)
    chamfer2_piece_7b = split(chamfer2_piece_7b, bisect_by=Plane(origin=(-23.465432357, 14.898528674, -14.670206373), z_dir=(-0.7071067811865478, 0.7071067811865474, 0)), keep=Keep.TOP, mode=Mode.PRIVATE)
    chamfer2_piece_7 = chamfer2_piece_7a & chamfer2_piece_7b
    add(chamfer2_piece_7, mode=Mode.SUBTRACT)


solid = part.part
